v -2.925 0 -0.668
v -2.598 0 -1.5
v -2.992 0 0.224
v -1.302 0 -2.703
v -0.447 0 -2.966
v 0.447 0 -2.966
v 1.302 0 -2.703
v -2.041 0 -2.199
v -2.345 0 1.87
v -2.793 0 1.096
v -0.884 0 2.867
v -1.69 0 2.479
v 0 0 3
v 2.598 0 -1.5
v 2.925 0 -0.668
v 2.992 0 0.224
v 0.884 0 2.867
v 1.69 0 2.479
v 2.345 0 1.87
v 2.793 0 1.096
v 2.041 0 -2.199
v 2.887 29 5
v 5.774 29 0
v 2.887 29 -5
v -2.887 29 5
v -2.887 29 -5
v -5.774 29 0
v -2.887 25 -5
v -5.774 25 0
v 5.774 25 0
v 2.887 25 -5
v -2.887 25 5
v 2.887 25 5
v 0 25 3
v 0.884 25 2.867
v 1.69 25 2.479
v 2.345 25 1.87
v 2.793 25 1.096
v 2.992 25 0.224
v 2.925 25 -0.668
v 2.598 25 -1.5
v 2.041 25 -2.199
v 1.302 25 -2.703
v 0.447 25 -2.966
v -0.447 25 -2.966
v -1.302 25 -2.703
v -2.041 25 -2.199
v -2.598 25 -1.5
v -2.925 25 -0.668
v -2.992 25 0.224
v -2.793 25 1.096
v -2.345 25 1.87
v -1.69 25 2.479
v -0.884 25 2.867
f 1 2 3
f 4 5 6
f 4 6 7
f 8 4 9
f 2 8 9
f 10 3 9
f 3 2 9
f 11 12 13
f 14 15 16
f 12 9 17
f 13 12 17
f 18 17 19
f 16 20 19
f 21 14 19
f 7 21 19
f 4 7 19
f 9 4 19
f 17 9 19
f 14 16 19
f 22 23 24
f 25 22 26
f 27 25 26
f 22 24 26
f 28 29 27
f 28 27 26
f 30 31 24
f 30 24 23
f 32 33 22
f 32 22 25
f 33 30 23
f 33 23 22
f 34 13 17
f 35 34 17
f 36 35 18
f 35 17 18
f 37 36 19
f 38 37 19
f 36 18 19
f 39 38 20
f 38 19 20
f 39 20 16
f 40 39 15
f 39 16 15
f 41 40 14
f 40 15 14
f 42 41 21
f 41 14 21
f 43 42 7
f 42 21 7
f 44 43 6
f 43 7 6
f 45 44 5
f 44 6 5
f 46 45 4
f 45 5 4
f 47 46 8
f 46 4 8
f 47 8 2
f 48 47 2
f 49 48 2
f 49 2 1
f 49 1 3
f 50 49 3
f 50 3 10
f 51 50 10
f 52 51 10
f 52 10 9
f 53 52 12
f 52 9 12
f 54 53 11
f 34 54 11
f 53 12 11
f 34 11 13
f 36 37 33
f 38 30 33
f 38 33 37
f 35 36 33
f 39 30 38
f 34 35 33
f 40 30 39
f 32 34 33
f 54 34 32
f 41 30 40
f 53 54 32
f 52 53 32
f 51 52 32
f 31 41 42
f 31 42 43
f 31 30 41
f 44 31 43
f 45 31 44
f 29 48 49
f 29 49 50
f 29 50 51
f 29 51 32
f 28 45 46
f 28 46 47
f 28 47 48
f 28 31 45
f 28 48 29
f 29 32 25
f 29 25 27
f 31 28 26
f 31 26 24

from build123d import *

# Parameters (mm, degrees)
SHANK_PROFILE_R = 3
SHANK_DEPTH     = 25
HEAD_START      = 25
HEAD_DEPTH      = 4


with BuildPart() as part:
    # Shank Profile → Shank (new body)
    with BuildSketch(Plane(origin=(0, 0, 0), x_dir=(1, 0, 0), z_dir=(0, 1, 0))):
        with Locations(Location((0, 0, 0), (0, 0, 270))):
            Circle(SHANK_PROFILE_R)
    extrude(amount=SHANK_DEPTH)

    # Head Profile → Head (add)
    with BuildSketch(Plane(origin=(0, 0, 0), x_dir=(1, 0, 0), z_dir=(0, 1, 0)).offset(HEAD_START)):
        Polygon((5.773502692, 0), (2.886751346, -5), (-2.886751346, -5), (-5.773502692, 0), (-2.886751346, 5), (2.886751346, 5), align=None)
    extrude(amount=HEAD_DEPTH)


solid = part.part
